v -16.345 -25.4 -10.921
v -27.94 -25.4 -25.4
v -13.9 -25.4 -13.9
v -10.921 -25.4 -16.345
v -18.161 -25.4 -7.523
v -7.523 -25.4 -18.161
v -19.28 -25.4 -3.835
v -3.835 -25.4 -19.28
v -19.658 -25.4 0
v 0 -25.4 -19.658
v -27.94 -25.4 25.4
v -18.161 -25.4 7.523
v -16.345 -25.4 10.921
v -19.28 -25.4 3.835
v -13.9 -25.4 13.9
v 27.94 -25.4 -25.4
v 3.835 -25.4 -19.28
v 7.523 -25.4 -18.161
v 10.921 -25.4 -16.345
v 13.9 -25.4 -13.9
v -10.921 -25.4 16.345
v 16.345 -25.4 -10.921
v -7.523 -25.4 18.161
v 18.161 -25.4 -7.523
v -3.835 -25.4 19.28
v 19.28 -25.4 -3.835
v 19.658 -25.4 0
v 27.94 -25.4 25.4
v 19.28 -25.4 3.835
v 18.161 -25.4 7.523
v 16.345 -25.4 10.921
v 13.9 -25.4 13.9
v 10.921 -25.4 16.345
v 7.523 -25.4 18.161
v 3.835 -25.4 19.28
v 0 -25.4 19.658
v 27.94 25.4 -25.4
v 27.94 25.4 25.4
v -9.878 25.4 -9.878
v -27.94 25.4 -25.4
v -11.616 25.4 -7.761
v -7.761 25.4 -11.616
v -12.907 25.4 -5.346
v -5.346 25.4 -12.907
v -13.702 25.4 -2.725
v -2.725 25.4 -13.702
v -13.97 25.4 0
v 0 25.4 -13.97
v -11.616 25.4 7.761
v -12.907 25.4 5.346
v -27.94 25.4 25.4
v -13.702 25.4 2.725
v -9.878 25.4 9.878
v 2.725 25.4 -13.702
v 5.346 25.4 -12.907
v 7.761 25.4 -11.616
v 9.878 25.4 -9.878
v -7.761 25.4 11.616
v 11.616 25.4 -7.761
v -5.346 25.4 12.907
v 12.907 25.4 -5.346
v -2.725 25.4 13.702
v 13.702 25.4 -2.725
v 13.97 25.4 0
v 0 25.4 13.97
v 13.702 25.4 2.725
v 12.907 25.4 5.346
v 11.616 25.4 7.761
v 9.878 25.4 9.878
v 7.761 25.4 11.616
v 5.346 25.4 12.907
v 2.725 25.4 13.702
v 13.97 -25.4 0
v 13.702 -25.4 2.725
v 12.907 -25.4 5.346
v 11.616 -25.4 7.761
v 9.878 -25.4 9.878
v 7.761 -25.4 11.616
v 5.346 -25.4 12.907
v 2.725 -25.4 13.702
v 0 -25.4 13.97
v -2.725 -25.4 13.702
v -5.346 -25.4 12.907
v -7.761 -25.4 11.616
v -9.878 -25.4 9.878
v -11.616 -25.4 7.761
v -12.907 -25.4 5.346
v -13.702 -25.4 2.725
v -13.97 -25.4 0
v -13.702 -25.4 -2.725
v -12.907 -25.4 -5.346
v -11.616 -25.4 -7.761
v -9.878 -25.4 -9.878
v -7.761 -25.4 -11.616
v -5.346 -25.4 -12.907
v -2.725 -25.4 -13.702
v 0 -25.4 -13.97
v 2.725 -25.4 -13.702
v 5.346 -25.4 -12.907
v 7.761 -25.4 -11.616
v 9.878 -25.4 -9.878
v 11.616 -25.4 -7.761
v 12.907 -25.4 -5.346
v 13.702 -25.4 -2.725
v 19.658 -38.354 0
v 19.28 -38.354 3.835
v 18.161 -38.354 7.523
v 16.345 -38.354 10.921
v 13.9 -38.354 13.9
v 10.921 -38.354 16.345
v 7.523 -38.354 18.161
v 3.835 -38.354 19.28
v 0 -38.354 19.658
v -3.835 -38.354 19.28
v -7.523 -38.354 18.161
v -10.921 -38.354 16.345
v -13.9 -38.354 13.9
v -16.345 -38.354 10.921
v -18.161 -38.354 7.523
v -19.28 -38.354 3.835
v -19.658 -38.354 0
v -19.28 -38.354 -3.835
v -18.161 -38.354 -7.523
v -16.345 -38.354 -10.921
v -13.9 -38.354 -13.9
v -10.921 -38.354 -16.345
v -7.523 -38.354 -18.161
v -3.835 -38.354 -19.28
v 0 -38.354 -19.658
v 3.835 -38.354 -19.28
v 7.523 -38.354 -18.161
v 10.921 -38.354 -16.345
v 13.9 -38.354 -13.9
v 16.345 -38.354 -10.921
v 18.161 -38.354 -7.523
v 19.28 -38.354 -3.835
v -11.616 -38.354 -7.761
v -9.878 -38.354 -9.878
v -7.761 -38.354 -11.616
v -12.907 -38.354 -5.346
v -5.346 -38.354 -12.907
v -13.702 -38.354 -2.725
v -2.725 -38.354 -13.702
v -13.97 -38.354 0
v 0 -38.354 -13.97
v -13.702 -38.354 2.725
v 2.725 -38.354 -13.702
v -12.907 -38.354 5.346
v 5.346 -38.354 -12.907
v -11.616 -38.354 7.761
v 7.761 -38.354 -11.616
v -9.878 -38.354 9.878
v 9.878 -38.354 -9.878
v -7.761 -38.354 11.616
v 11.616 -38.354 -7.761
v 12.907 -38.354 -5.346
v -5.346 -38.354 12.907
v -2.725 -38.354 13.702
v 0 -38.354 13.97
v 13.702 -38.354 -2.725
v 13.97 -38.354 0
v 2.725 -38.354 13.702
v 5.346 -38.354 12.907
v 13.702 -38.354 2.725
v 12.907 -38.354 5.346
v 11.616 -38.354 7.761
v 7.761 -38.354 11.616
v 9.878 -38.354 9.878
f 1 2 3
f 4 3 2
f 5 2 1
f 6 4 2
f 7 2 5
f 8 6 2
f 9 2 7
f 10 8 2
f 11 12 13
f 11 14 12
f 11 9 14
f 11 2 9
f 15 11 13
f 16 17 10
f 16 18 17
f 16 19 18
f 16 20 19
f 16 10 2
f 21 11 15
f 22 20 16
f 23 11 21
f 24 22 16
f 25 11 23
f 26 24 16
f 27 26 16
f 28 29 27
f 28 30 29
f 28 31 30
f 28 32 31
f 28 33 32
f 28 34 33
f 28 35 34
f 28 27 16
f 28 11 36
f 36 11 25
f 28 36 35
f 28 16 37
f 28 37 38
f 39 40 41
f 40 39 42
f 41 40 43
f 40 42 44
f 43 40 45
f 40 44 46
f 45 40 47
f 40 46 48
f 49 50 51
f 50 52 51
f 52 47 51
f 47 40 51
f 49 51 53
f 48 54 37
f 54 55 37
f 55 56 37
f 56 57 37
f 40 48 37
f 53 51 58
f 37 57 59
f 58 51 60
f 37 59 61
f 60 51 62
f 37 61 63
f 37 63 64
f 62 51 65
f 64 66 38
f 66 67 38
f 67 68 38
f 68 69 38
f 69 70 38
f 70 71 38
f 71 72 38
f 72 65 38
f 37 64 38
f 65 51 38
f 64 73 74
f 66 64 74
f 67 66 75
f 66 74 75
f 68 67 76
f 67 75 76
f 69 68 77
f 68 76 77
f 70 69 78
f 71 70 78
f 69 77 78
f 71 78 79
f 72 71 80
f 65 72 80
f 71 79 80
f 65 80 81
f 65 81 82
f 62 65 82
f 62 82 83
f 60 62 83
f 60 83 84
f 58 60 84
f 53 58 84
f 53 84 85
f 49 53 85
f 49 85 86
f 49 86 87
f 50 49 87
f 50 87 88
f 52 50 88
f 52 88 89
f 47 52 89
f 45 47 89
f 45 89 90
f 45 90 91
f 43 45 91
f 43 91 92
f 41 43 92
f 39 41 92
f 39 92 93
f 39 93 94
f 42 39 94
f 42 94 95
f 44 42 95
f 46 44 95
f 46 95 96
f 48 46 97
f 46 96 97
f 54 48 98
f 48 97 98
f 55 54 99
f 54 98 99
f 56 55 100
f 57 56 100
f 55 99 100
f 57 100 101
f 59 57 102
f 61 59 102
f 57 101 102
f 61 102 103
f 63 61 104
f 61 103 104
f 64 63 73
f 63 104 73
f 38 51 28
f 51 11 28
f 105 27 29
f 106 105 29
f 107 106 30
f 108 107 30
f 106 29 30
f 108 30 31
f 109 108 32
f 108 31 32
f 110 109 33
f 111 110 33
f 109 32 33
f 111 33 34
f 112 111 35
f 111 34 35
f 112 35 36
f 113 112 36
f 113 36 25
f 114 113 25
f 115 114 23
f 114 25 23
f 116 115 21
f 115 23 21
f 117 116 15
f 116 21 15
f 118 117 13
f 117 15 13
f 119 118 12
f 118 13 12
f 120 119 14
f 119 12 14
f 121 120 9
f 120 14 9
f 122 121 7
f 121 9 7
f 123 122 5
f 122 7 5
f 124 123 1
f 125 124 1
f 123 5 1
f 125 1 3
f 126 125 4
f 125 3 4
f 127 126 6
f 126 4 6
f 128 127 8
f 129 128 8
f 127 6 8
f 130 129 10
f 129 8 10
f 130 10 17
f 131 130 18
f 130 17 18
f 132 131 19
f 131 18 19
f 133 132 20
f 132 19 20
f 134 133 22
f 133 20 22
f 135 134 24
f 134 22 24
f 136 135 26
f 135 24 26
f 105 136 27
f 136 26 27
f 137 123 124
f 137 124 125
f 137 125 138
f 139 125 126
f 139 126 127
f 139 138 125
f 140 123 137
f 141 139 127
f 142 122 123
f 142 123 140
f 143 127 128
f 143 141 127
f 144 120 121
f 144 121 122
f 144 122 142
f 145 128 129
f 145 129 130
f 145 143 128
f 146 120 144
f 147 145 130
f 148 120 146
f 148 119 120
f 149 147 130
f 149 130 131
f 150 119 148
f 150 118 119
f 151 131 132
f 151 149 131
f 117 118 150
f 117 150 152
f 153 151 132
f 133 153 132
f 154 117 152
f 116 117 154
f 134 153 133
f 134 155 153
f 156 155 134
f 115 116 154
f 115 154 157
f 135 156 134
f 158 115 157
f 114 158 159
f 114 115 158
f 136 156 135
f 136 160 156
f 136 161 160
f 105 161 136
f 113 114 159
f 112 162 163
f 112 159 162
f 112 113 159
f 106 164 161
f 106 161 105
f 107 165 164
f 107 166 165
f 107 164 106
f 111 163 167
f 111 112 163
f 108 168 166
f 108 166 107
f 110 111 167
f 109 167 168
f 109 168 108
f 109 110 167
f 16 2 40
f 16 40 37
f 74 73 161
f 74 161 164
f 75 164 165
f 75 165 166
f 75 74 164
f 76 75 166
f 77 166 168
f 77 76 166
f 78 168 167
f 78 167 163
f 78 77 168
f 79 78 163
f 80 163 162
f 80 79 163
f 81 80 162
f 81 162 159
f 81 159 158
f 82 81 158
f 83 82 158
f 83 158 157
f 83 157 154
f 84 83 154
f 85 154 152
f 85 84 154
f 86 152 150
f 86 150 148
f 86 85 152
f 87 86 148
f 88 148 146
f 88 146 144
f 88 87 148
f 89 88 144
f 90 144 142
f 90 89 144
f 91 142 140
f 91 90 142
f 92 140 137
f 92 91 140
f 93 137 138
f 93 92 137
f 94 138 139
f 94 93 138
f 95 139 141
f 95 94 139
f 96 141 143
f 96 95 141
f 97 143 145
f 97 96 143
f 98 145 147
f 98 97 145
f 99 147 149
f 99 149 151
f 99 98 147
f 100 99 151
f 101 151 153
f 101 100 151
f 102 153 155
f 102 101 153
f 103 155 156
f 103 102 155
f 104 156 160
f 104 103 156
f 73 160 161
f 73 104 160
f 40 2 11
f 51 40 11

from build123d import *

# Parameters (mm, degrees)
F0_W     = 55.88
F0_H     = 50.8
F1_DEPTH = 25.4
F2_R     = 13.97
F3_DEPTH = 127
F4_R     = 19.6578172959
F4_R_2   = 13.97
F5_DEPTH = 12.954


with BuildPart() as f1:
    # F0 (on Front) → F1 (new body, symmetric)
    with BuildSketch(Plane.XZ):
        Rectangle(F0_W, F0_H)
    extrude(amount=F1_DEPTH, both=True)

    # F2 (on face) → F3 (cut)
    with BuildSketch(Plane.XZ.offset(25.4)):
        Circle(F2_R)
    extrude(amount=-F3_DEPTH, mode=Mode.SUBTRACT)

    # F4 (on face) → F5 (join)
    with BuildSketch(Plane.XZ.offset(25.4)):
        Circle(F4_R)
        Circle(F4_R_2, mode=Mode.SUBTRACT)
    extrude(amount=F5_DEPTH)


solid = f1.part
